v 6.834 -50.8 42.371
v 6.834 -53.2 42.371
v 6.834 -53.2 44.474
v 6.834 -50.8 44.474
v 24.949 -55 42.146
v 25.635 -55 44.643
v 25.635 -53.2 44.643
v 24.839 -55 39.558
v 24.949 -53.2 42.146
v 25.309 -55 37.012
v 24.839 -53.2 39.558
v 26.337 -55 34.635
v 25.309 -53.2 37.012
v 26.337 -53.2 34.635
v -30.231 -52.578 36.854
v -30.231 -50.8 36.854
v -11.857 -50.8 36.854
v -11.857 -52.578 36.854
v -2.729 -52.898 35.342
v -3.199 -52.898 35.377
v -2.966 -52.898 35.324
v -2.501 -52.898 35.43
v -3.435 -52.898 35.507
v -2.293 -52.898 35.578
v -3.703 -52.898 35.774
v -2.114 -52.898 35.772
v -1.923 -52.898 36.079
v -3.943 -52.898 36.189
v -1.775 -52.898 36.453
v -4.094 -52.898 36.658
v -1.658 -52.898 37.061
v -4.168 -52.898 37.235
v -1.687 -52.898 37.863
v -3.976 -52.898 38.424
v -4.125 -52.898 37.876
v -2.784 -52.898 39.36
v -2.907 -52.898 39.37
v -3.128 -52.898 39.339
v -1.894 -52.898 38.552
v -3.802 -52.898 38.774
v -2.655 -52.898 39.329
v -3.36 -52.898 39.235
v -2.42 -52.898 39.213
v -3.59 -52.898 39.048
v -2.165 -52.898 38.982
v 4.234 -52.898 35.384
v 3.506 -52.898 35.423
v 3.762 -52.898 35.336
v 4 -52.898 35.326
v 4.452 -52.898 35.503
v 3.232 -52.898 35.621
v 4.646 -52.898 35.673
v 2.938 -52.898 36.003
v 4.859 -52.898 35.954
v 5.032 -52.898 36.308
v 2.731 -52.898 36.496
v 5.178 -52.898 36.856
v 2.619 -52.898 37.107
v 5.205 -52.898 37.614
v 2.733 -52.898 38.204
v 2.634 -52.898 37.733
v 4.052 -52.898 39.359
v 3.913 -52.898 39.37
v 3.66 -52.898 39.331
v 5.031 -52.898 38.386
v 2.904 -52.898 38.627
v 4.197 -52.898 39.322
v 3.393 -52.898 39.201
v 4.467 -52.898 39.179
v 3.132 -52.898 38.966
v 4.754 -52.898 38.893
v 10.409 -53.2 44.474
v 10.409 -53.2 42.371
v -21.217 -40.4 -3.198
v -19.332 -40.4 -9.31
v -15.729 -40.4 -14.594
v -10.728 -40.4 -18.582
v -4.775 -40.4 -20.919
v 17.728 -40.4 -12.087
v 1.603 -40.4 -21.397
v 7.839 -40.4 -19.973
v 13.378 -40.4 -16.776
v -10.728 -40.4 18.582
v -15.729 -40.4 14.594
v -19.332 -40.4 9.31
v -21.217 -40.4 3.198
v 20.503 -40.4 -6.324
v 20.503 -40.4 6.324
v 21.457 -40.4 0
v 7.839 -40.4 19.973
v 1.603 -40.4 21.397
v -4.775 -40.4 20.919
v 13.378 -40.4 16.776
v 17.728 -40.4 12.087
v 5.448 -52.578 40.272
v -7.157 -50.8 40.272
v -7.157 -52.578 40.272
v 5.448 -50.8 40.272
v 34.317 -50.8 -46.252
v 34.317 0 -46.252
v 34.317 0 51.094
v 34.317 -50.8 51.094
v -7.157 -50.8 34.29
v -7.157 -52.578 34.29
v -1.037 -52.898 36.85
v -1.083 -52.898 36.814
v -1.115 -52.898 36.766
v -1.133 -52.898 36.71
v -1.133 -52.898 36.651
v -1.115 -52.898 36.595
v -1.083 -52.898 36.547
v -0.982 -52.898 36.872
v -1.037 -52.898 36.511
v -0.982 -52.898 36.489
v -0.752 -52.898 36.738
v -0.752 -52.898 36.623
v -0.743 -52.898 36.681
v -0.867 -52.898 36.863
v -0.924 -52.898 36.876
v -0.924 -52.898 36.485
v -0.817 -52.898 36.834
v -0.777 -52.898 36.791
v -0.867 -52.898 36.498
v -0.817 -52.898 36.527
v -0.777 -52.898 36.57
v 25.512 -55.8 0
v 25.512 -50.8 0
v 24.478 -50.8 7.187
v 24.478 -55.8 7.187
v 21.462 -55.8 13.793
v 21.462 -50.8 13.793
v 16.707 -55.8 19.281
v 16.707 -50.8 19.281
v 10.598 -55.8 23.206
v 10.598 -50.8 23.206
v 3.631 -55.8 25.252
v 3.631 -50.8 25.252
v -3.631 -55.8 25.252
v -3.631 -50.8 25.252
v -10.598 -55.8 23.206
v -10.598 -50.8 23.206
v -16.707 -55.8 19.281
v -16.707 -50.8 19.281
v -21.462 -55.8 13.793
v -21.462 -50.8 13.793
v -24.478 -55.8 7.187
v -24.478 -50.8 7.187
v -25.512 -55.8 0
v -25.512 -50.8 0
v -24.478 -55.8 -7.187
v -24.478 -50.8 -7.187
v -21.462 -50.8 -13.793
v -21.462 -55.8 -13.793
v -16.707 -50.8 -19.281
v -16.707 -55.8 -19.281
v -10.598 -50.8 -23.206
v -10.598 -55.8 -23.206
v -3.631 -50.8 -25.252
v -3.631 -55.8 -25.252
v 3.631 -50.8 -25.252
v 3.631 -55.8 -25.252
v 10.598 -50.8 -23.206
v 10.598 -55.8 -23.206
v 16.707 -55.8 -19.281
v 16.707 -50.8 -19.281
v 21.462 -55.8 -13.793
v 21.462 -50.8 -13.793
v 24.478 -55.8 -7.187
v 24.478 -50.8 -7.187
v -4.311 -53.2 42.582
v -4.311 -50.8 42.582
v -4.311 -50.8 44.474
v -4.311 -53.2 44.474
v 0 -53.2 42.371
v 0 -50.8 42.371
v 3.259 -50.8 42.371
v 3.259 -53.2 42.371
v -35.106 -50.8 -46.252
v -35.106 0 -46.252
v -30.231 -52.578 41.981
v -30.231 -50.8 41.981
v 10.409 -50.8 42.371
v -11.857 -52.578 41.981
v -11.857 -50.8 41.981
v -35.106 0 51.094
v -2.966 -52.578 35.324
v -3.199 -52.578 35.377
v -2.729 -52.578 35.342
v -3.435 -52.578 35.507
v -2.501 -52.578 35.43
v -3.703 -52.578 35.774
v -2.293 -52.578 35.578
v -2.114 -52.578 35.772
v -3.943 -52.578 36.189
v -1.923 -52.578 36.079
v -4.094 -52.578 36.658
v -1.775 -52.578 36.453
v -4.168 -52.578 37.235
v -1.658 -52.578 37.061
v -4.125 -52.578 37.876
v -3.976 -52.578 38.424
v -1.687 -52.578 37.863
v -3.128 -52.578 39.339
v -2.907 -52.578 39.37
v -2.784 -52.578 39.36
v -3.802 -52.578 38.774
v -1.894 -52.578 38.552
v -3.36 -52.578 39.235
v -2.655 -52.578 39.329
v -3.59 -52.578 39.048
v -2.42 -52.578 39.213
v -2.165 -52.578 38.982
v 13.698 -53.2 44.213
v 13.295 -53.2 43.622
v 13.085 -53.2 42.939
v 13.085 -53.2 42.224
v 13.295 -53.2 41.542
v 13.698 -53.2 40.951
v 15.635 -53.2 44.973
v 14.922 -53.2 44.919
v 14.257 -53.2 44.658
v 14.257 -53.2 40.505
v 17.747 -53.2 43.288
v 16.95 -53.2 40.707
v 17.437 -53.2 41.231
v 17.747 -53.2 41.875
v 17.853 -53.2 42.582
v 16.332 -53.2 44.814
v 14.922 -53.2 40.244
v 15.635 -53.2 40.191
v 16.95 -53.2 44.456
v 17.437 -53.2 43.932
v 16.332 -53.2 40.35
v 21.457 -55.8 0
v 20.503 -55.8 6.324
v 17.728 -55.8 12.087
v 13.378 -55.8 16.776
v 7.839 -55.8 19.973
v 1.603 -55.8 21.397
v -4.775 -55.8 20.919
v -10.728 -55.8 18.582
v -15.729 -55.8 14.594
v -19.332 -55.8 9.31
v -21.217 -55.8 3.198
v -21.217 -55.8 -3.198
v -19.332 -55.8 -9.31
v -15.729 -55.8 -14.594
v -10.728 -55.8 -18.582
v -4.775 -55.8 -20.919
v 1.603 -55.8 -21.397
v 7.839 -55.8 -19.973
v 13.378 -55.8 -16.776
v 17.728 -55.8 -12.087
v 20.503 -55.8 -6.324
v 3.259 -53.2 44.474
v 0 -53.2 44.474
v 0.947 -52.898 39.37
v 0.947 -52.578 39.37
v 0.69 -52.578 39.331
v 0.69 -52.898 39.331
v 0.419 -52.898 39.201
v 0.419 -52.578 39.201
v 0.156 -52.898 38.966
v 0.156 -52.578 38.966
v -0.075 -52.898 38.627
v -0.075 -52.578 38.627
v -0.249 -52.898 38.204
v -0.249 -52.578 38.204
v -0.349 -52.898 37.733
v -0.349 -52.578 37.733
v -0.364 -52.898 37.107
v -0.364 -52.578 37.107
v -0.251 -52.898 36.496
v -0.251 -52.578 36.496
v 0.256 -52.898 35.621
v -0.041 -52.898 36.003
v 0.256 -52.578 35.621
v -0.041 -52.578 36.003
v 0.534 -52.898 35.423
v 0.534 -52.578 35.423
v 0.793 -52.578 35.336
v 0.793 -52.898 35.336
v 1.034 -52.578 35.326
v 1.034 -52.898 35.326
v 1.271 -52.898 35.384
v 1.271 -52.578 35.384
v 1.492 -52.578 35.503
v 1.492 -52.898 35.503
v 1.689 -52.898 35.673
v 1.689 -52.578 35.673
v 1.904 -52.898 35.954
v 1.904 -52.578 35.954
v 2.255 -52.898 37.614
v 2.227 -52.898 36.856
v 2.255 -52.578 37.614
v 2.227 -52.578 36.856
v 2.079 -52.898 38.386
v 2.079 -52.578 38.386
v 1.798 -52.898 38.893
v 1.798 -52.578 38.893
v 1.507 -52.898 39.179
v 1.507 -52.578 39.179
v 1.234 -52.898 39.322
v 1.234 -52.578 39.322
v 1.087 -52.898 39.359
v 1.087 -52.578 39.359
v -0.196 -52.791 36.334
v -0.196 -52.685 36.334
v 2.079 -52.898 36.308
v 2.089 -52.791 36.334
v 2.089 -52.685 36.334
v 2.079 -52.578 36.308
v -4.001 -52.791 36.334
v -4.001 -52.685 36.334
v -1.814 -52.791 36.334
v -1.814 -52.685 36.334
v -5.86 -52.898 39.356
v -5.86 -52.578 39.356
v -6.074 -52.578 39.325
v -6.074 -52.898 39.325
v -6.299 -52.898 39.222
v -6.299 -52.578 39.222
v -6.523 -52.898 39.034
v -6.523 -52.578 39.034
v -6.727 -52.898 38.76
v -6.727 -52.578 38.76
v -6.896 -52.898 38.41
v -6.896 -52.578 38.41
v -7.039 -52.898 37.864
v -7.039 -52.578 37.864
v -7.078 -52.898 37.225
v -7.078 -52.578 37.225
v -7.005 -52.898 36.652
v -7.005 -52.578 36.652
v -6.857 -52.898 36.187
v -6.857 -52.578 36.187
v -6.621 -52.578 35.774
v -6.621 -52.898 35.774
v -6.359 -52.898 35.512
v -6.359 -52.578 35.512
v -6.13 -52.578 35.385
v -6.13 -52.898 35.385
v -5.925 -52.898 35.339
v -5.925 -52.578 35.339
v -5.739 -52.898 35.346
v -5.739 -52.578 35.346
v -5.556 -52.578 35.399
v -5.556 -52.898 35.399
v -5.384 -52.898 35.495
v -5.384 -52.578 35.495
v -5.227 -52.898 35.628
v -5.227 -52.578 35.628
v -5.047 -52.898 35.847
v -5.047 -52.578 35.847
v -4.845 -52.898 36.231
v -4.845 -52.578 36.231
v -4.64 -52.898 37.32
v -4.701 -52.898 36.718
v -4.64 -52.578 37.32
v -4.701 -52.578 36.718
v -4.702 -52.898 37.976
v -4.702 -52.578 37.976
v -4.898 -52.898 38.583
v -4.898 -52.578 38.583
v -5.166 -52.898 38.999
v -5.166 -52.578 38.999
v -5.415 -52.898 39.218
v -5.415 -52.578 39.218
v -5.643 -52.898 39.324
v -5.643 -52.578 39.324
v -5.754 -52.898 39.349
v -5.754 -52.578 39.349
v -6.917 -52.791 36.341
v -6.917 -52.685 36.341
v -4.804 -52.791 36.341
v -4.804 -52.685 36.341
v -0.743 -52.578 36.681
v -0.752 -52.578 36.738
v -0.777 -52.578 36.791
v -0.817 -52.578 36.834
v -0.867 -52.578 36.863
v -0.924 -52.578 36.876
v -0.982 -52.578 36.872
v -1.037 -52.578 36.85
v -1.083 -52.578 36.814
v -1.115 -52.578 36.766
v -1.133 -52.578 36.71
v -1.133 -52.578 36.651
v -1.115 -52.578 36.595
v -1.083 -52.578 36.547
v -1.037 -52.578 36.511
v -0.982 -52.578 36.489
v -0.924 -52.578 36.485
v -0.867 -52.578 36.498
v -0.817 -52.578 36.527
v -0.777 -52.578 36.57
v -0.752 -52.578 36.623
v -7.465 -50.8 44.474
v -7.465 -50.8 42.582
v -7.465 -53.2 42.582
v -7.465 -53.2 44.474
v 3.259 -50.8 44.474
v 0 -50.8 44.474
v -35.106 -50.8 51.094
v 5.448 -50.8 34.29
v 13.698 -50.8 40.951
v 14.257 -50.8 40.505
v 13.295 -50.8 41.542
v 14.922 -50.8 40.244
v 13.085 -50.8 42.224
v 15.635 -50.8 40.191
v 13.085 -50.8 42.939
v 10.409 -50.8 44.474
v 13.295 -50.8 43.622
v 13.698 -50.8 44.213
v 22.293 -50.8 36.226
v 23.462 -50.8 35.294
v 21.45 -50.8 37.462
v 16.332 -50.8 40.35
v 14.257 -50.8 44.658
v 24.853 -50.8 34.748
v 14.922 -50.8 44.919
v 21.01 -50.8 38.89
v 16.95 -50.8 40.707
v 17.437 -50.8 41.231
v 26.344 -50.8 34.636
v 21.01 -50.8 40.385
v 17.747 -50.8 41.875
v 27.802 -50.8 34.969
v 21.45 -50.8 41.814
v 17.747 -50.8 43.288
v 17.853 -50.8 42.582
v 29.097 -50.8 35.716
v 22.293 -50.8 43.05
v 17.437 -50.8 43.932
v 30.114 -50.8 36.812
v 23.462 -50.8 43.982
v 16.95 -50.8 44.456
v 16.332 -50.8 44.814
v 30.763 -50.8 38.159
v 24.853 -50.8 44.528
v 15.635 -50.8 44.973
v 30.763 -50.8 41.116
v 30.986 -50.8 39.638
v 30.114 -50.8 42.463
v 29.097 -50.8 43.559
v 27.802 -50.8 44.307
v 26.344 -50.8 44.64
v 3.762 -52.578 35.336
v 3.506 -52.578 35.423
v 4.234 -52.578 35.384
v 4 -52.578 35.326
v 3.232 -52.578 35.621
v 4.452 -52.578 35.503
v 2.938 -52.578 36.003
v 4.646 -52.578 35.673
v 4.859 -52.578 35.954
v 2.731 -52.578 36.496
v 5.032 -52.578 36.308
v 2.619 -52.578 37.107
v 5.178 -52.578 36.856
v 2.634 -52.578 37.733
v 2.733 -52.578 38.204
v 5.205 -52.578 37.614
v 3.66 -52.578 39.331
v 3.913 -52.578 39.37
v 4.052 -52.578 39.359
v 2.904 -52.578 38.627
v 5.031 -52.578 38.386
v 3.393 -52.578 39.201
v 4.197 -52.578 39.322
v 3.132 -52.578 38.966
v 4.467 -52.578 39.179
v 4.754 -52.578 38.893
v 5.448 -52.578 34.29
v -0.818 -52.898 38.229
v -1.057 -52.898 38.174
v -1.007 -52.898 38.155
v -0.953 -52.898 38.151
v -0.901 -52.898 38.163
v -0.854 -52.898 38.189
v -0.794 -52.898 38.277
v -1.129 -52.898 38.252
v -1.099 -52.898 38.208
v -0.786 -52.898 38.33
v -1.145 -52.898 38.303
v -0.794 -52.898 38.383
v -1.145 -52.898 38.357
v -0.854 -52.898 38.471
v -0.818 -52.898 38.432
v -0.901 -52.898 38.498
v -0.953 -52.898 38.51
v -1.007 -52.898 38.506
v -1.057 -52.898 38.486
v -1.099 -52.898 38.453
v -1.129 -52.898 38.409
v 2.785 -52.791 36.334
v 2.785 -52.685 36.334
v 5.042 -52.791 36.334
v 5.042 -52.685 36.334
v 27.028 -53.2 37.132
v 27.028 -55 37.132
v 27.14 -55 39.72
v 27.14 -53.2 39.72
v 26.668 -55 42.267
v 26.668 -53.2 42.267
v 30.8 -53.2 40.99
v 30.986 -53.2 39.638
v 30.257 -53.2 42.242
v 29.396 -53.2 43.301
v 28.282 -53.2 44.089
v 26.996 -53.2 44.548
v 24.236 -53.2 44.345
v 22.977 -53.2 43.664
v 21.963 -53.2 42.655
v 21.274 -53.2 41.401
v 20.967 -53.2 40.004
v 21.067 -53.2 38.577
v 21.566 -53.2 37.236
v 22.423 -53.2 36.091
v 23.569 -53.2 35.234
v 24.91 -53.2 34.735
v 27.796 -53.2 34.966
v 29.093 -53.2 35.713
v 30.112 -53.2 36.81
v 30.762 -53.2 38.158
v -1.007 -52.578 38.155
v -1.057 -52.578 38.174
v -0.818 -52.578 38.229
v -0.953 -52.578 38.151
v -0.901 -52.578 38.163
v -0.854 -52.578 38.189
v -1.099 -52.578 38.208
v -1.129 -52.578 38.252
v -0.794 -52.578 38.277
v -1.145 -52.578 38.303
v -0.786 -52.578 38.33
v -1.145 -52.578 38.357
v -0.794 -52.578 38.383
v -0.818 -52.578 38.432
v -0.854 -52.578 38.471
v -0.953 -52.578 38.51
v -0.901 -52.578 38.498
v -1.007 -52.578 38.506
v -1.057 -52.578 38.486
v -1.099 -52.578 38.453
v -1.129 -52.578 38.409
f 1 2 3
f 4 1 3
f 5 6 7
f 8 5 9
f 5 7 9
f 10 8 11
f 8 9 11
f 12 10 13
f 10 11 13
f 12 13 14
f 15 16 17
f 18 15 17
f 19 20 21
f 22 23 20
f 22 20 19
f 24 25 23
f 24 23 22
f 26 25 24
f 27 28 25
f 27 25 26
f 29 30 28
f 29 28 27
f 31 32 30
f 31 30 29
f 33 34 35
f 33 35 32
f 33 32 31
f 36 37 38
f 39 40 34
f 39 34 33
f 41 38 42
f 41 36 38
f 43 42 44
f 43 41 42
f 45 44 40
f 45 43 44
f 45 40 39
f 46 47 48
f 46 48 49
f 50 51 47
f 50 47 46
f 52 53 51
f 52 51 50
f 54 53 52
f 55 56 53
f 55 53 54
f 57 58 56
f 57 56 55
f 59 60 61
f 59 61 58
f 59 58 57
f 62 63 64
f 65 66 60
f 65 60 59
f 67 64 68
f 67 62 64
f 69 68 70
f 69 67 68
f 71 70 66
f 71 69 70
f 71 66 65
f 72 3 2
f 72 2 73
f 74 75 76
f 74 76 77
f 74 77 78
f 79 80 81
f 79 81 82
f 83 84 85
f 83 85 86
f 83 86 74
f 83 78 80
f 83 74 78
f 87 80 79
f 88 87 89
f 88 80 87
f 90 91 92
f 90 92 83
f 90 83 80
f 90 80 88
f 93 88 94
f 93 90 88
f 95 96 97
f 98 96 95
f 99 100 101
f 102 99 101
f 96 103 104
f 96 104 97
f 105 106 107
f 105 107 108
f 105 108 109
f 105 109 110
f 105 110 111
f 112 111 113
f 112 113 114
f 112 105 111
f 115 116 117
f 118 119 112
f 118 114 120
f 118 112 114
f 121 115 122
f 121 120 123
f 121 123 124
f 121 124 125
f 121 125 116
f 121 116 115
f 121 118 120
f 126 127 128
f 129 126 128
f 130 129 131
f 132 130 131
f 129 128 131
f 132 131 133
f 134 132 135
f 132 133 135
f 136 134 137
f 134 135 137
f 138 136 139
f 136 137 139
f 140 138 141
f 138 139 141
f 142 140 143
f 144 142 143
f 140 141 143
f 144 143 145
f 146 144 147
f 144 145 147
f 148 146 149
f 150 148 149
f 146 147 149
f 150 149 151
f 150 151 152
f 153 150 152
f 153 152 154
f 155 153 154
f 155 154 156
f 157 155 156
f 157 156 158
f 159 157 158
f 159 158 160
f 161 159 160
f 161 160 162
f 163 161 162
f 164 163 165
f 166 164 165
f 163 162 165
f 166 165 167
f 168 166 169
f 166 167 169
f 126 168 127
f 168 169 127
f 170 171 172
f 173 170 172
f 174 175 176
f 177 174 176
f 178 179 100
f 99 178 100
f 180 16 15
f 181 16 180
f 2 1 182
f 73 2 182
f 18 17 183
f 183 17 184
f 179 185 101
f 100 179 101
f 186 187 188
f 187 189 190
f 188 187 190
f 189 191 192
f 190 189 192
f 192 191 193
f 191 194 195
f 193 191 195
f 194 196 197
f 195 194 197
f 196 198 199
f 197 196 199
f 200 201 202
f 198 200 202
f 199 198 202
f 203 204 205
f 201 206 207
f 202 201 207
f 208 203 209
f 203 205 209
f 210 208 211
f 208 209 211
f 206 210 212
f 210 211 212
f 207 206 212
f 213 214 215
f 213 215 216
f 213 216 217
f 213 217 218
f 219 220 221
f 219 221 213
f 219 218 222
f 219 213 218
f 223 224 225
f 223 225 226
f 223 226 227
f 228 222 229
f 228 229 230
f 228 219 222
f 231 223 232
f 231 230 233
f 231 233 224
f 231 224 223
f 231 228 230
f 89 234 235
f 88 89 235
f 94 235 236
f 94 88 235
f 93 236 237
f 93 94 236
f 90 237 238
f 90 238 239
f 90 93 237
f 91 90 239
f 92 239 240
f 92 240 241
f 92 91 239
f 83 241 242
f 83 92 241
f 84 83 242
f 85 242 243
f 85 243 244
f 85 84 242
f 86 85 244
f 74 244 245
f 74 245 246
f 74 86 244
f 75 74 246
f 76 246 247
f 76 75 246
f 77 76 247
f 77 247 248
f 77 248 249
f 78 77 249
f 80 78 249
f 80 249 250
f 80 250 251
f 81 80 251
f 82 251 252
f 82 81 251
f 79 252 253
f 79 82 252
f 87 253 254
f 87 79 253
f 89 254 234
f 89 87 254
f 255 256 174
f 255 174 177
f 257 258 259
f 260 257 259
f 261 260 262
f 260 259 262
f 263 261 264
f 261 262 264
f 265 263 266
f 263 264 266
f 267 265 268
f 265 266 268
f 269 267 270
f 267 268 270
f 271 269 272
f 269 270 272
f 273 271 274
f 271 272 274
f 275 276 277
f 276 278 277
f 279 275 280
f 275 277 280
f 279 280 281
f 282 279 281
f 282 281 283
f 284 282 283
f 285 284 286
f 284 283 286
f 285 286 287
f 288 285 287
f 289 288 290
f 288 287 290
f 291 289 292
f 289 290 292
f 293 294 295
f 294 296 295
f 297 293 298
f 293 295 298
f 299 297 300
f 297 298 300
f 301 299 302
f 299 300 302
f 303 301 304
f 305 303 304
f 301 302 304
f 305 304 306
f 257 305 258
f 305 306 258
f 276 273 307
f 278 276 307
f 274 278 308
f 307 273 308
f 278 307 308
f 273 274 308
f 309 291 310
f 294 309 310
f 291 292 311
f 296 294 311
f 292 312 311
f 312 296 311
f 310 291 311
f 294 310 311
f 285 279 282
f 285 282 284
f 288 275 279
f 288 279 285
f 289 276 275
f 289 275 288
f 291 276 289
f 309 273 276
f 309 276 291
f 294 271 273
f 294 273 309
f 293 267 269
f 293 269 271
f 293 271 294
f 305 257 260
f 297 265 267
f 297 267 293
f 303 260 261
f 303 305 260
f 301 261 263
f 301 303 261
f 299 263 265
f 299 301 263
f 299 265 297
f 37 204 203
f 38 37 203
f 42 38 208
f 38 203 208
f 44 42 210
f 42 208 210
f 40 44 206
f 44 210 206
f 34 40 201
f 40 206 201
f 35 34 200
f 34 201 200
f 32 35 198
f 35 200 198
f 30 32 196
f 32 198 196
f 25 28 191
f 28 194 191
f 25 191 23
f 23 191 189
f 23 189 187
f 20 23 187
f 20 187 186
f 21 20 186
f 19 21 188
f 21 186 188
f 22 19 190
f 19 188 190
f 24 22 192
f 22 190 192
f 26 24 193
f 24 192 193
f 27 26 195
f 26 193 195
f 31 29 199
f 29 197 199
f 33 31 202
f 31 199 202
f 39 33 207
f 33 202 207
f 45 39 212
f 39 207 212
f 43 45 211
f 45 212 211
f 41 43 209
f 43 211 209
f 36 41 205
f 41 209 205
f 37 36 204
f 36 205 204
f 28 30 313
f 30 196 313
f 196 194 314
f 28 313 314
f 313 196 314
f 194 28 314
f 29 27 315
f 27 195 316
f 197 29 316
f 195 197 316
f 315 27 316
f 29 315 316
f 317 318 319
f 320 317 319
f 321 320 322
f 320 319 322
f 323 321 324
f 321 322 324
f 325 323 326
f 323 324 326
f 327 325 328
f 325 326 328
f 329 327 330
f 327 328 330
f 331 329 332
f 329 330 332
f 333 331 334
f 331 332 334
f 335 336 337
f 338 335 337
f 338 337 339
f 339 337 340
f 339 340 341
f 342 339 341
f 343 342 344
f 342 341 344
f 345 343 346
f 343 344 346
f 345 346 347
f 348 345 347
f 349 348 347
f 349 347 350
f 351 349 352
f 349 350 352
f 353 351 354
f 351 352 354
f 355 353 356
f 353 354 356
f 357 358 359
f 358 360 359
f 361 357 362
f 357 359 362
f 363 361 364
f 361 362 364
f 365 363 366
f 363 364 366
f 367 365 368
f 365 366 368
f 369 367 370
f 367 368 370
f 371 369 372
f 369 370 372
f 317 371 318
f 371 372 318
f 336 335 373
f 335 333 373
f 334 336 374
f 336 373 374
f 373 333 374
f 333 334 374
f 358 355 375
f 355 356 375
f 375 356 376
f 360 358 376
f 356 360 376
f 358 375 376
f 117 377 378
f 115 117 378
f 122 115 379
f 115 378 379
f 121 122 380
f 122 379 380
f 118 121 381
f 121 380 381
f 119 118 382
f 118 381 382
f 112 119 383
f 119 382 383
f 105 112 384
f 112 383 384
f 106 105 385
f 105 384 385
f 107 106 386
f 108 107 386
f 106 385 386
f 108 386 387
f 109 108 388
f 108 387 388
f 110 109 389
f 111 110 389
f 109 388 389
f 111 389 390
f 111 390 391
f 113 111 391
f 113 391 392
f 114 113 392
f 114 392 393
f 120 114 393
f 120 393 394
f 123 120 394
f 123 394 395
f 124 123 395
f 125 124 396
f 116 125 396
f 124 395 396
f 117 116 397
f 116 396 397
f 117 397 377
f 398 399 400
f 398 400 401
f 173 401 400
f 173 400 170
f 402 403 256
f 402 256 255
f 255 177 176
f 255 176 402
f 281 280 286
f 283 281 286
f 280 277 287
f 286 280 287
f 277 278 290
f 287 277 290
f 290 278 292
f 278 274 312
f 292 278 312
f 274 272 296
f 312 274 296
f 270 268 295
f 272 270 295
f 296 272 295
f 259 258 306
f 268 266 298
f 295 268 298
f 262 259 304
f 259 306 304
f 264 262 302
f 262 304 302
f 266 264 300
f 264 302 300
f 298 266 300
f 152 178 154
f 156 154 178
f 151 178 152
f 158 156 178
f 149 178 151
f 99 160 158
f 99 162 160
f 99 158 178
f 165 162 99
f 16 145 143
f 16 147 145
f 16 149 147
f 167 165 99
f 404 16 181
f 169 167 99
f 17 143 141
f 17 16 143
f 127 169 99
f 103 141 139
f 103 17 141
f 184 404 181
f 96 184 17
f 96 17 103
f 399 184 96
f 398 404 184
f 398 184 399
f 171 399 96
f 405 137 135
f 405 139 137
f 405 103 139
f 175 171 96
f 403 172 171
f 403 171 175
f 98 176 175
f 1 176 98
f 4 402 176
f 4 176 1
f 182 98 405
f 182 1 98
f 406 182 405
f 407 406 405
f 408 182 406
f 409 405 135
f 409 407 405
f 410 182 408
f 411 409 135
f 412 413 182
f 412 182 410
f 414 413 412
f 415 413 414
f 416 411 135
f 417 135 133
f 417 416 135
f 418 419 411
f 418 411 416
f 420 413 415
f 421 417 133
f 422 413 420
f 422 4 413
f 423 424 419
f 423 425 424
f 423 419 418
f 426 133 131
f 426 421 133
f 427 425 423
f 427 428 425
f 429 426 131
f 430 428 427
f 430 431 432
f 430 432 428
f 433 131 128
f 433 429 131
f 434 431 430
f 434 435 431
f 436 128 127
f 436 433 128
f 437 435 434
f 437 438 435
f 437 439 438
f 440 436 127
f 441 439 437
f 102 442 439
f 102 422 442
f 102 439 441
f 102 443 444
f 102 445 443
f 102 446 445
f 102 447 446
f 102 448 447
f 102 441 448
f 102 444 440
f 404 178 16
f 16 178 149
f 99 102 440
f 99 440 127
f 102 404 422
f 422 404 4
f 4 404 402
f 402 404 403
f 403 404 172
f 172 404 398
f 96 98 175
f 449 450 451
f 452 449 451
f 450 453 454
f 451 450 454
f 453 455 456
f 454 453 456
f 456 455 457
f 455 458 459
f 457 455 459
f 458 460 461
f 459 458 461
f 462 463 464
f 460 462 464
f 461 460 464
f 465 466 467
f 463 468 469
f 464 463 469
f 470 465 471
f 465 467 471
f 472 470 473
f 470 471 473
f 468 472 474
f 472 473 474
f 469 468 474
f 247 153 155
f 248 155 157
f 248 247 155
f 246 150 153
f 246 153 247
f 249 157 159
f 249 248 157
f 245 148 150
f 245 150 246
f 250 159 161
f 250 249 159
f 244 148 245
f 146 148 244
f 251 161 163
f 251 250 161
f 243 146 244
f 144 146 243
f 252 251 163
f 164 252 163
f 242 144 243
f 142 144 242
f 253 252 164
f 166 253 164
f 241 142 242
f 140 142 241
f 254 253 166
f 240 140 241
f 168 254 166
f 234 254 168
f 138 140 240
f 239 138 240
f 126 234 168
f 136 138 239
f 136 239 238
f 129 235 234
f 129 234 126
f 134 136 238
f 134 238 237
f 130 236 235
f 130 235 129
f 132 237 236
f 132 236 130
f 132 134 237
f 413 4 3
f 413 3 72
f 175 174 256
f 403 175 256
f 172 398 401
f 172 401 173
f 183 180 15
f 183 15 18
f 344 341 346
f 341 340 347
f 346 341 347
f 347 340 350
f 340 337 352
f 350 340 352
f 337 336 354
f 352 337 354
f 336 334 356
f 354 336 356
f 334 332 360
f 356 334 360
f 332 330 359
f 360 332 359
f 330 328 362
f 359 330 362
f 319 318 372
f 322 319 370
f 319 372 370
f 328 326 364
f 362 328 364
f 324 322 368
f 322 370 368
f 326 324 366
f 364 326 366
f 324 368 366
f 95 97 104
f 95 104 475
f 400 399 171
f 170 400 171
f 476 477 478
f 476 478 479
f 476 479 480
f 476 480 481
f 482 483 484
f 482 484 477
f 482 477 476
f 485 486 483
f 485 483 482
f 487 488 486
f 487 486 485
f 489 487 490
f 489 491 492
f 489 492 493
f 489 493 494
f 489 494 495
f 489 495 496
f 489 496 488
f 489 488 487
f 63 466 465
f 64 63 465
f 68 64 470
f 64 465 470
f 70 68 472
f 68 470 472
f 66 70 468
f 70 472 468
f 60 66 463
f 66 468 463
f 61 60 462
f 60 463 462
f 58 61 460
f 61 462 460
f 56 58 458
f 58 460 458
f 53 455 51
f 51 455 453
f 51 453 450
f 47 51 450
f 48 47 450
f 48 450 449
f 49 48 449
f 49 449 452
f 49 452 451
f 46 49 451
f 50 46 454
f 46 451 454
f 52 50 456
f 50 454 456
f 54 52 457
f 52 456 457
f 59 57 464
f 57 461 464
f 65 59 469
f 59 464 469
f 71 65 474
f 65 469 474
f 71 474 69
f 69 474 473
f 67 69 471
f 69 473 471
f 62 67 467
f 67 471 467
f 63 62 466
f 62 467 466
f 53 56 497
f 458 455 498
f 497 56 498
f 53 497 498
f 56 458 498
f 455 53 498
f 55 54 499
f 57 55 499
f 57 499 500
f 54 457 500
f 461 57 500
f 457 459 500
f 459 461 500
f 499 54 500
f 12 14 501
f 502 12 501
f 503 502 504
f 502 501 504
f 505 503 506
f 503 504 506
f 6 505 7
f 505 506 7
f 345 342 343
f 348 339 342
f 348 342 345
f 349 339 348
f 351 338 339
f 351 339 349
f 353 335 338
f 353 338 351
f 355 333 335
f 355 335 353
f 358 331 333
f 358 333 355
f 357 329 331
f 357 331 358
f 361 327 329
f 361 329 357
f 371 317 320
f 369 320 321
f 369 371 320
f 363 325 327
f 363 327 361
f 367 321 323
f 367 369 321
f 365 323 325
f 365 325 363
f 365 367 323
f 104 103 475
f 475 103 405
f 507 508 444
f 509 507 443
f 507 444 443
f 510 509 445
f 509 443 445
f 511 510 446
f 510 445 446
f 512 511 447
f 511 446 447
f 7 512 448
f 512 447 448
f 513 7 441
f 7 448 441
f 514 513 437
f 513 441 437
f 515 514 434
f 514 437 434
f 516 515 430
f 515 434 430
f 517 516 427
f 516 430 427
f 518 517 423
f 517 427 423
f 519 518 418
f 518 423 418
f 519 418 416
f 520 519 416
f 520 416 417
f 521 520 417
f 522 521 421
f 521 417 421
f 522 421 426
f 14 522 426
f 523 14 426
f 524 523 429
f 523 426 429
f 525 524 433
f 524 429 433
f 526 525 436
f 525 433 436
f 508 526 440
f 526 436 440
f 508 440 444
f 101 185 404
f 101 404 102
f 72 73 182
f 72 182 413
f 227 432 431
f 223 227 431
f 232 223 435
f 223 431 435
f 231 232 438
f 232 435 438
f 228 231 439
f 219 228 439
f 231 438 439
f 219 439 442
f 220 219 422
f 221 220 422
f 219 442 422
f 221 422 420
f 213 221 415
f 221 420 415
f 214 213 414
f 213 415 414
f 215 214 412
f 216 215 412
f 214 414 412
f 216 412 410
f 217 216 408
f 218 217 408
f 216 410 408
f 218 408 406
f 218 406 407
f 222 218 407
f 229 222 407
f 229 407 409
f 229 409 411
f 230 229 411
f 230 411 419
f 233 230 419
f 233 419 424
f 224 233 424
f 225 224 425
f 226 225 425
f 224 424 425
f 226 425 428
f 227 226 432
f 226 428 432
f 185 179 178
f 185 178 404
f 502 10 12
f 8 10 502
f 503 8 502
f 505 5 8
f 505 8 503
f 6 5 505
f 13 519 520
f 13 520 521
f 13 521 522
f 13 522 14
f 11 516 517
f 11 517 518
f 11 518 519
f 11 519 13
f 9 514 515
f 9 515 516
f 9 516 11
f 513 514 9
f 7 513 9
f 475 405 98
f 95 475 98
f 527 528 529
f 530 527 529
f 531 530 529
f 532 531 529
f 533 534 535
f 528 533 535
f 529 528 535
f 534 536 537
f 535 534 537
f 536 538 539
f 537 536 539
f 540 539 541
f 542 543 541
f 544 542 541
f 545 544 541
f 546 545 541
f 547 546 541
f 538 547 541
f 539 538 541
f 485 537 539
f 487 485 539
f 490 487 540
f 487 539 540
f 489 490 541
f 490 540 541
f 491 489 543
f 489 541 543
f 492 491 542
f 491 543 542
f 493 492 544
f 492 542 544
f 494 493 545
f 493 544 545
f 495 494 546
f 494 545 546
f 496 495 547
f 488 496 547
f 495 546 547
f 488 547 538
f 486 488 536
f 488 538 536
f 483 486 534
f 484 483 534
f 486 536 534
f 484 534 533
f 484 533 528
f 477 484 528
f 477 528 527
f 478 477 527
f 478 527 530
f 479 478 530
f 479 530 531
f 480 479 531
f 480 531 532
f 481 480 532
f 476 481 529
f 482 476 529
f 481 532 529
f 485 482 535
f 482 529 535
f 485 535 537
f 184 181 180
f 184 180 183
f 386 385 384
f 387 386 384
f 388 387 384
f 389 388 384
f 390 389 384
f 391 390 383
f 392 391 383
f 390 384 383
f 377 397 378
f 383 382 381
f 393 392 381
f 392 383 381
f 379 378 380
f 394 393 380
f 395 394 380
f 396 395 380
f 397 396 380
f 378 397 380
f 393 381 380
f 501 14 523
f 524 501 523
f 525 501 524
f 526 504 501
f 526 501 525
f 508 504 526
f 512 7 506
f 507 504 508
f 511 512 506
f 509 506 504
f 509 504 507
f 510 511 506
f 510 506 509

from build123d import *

# Parameters (mm, degrees)
F0_W      = 69.422539
F0_H      = 97.34625
F1_DEPTH  = 50.8
F2_W      = 18.373456
F2_H      = 5.127479
F2_W_2    = 12.605046
F2_H_2    = 5.982056
F3_DEPTH  = 1.778
F4_R      = 25.511766
F4_R_2    = 21.456688
F5_DEPTH  = 5
F6_W      = 3.154204
F6_H      = 1.892522
F6_W_2    = 3.259345
F6_H_2    = 2.102803
F6_W_3    = 3.574766
F6_R      = 2.397568
F6_R_2    = 5.015971
F7_DEPTH  = 2.4
F9_DEPTH  = 1.8
F5_FACE_R = 21.456688
F10_DEPTH = 10.4
F11_R     = 0.180227
F11_R_2   = 0.196058
F12_DEPTH = 0.32


with BuildPart() as f1:
    # F0 (on Front) → F1 (new body)
    with BuildSketch(Plane.XZ):
        with Locations((-0.394358, 2.420751)):
            Rectangle(F0_W, F0_H)
    extrude(amount=F1_DEPTH)

    # F2 (on face) → F3 (join)
    with BuildSketch(Plane.XZ.offset(50.8)):
        with Locations((-21.04402, 39.417478)):
            Rectangle(F2_W, F2_H)
        with Locations((-0.854581, 37.281029)):
            Rectangle(F2_W_2, F2_H_2)
    extrude(amount=F3_DEPTH)

    # F4 (on face) → F5 (join)
    with BuildSketch(Plane.XZ.offset(50.8)):
        Circle(F4_R)
        Circle(F4_R_2, mode=Mode.SUBTRACT)
    extrude(amount=F5_DEPTH)

    # F6 (on face) → F7 (join)
    with BuildSketch(Plane.XZ.offset(50.8)):
        with Locations((-5.887851, 43.528039)):
            Rectangle(F6_W, F6_H)
        with Locations((1.629672, 43.422899)):
            Rectangle(F6_W_2, F6_H_2)
        with Locations((8.621496, 43.422899)):
            Rectangle(F6_W_3, F6_H_2)
        with Locations((15.455607, 42.581778)):
            Circle(F6_R)
        with Locations((25.969626, 39.637852)):
            Circle(F6_R_2)
    extrude(amount=F7_DEPTH)

    # F8 (on face) → F9 (join)
    with BuildSketch(Plane.XZ.offset(53.2)):
        with BuildLine():
            ThreePointArc((25.634725, 44.642631), (24.838576, 39.558498), (26.33684, 34.635341))
            ThreePointArc((26.33684, 34.635341), (27.140133, 39.719976), (25.634725, 44.642631))
        make_face()
    extrude(amount=F9_DEPTH)

    # F5_face (on face) → F10 (cut)
    with BuildSketch(Plane.XZ.offset(50.8)):
        Circle(F5_FACE_R)
    extrude(amount=-F10_DEPTH, mode=Mode.SUBTRACT)


with BuildPart() as f12:
    # F11 (on face) → F12 (new body)
    with BuildSketch(Plane.XZ.offset(52.578)):
        with Locations((-0.966582, 38.33032)):
            Circle(F11_R)
        with Locations((-0.938855, 36.680557)):
            Circle(F11_R_2)
        with BuildLine():
            add(Edge.make_bspline(
                [(-5.86041, 39.356221), (-7.973697, 39.356221), (-6.917054, 36.340903), (-5.86041, 33.325586), (-4.803766, 36.340903), (-3.747122, 39.356221), (-5.86041, 39.356221)],
                knots=[0, 0, 0, 2.094395, 2.094395, 4.18879, 4.18879, 6.283185, 6.283185, 6.283185], degree=2, weights=[1, 0.5, 1, 0.5, 1, 0.5, 1]))
        make_face()
        with BuildLine():
            add(Edge.make_bspline(
                [(-2.907477, 39.370082), (-5.093549, 39.370082), (-4.000513, 36.333973), (-2.907477, 33.297863), (-1.814441, 36.333973), (-0.721405, 39.370082), (-2.907477, 39.370082)],
                knots=[0, 0, 0, 2.094395, 2.094395, 4.18879, 4.18879, 6.283185, 6.283185, 6.283185], degree=2, weights=[1, 0.5, 1, 0.5, 1, 0.5, 1]))
        make_face()
        with BuildLine():
            add(Edge.make_bspline(
                [(0.946585, 39.370082), (-1.339115, 39.370082), (-0.196265, 36.333973), (0.946585, 33.297863), (2.089435, 36.333973), (3.232285, 39.370082), (0.946585, 39.370082)],
                knots=[0, 0, 0, 2.094395, 2.094395, 4.18879, 4.18879, 6.283185, 6.283185, 6.283185], degree=2, weights=[1, 0.5, 1, 0.5, 1, 0.5, 1]))
        make_face()
        with BuildLine():
            add(Edge.make_bspline(
                [(3.913382, 39.370082), (1.656169, 39.370082), (2.784775, 36.333973), (3.913382, 33.297863), (5.041988, 36.333973), (6.170594, 39.370082), (3.913382, 39.370082)],
                knots=[0, 0, 0, 2.094395, 2.094395, 4.18879, 4.18879, 6.283185, 6.283185, 6.283185], degree=2, weights=[1, 0.5, 1, 0.5, 1, 0.5, 1]))
        make_face()
    extrude(amount=F12_DEPTH)


solid = Compound([f1.part, f12.part])
